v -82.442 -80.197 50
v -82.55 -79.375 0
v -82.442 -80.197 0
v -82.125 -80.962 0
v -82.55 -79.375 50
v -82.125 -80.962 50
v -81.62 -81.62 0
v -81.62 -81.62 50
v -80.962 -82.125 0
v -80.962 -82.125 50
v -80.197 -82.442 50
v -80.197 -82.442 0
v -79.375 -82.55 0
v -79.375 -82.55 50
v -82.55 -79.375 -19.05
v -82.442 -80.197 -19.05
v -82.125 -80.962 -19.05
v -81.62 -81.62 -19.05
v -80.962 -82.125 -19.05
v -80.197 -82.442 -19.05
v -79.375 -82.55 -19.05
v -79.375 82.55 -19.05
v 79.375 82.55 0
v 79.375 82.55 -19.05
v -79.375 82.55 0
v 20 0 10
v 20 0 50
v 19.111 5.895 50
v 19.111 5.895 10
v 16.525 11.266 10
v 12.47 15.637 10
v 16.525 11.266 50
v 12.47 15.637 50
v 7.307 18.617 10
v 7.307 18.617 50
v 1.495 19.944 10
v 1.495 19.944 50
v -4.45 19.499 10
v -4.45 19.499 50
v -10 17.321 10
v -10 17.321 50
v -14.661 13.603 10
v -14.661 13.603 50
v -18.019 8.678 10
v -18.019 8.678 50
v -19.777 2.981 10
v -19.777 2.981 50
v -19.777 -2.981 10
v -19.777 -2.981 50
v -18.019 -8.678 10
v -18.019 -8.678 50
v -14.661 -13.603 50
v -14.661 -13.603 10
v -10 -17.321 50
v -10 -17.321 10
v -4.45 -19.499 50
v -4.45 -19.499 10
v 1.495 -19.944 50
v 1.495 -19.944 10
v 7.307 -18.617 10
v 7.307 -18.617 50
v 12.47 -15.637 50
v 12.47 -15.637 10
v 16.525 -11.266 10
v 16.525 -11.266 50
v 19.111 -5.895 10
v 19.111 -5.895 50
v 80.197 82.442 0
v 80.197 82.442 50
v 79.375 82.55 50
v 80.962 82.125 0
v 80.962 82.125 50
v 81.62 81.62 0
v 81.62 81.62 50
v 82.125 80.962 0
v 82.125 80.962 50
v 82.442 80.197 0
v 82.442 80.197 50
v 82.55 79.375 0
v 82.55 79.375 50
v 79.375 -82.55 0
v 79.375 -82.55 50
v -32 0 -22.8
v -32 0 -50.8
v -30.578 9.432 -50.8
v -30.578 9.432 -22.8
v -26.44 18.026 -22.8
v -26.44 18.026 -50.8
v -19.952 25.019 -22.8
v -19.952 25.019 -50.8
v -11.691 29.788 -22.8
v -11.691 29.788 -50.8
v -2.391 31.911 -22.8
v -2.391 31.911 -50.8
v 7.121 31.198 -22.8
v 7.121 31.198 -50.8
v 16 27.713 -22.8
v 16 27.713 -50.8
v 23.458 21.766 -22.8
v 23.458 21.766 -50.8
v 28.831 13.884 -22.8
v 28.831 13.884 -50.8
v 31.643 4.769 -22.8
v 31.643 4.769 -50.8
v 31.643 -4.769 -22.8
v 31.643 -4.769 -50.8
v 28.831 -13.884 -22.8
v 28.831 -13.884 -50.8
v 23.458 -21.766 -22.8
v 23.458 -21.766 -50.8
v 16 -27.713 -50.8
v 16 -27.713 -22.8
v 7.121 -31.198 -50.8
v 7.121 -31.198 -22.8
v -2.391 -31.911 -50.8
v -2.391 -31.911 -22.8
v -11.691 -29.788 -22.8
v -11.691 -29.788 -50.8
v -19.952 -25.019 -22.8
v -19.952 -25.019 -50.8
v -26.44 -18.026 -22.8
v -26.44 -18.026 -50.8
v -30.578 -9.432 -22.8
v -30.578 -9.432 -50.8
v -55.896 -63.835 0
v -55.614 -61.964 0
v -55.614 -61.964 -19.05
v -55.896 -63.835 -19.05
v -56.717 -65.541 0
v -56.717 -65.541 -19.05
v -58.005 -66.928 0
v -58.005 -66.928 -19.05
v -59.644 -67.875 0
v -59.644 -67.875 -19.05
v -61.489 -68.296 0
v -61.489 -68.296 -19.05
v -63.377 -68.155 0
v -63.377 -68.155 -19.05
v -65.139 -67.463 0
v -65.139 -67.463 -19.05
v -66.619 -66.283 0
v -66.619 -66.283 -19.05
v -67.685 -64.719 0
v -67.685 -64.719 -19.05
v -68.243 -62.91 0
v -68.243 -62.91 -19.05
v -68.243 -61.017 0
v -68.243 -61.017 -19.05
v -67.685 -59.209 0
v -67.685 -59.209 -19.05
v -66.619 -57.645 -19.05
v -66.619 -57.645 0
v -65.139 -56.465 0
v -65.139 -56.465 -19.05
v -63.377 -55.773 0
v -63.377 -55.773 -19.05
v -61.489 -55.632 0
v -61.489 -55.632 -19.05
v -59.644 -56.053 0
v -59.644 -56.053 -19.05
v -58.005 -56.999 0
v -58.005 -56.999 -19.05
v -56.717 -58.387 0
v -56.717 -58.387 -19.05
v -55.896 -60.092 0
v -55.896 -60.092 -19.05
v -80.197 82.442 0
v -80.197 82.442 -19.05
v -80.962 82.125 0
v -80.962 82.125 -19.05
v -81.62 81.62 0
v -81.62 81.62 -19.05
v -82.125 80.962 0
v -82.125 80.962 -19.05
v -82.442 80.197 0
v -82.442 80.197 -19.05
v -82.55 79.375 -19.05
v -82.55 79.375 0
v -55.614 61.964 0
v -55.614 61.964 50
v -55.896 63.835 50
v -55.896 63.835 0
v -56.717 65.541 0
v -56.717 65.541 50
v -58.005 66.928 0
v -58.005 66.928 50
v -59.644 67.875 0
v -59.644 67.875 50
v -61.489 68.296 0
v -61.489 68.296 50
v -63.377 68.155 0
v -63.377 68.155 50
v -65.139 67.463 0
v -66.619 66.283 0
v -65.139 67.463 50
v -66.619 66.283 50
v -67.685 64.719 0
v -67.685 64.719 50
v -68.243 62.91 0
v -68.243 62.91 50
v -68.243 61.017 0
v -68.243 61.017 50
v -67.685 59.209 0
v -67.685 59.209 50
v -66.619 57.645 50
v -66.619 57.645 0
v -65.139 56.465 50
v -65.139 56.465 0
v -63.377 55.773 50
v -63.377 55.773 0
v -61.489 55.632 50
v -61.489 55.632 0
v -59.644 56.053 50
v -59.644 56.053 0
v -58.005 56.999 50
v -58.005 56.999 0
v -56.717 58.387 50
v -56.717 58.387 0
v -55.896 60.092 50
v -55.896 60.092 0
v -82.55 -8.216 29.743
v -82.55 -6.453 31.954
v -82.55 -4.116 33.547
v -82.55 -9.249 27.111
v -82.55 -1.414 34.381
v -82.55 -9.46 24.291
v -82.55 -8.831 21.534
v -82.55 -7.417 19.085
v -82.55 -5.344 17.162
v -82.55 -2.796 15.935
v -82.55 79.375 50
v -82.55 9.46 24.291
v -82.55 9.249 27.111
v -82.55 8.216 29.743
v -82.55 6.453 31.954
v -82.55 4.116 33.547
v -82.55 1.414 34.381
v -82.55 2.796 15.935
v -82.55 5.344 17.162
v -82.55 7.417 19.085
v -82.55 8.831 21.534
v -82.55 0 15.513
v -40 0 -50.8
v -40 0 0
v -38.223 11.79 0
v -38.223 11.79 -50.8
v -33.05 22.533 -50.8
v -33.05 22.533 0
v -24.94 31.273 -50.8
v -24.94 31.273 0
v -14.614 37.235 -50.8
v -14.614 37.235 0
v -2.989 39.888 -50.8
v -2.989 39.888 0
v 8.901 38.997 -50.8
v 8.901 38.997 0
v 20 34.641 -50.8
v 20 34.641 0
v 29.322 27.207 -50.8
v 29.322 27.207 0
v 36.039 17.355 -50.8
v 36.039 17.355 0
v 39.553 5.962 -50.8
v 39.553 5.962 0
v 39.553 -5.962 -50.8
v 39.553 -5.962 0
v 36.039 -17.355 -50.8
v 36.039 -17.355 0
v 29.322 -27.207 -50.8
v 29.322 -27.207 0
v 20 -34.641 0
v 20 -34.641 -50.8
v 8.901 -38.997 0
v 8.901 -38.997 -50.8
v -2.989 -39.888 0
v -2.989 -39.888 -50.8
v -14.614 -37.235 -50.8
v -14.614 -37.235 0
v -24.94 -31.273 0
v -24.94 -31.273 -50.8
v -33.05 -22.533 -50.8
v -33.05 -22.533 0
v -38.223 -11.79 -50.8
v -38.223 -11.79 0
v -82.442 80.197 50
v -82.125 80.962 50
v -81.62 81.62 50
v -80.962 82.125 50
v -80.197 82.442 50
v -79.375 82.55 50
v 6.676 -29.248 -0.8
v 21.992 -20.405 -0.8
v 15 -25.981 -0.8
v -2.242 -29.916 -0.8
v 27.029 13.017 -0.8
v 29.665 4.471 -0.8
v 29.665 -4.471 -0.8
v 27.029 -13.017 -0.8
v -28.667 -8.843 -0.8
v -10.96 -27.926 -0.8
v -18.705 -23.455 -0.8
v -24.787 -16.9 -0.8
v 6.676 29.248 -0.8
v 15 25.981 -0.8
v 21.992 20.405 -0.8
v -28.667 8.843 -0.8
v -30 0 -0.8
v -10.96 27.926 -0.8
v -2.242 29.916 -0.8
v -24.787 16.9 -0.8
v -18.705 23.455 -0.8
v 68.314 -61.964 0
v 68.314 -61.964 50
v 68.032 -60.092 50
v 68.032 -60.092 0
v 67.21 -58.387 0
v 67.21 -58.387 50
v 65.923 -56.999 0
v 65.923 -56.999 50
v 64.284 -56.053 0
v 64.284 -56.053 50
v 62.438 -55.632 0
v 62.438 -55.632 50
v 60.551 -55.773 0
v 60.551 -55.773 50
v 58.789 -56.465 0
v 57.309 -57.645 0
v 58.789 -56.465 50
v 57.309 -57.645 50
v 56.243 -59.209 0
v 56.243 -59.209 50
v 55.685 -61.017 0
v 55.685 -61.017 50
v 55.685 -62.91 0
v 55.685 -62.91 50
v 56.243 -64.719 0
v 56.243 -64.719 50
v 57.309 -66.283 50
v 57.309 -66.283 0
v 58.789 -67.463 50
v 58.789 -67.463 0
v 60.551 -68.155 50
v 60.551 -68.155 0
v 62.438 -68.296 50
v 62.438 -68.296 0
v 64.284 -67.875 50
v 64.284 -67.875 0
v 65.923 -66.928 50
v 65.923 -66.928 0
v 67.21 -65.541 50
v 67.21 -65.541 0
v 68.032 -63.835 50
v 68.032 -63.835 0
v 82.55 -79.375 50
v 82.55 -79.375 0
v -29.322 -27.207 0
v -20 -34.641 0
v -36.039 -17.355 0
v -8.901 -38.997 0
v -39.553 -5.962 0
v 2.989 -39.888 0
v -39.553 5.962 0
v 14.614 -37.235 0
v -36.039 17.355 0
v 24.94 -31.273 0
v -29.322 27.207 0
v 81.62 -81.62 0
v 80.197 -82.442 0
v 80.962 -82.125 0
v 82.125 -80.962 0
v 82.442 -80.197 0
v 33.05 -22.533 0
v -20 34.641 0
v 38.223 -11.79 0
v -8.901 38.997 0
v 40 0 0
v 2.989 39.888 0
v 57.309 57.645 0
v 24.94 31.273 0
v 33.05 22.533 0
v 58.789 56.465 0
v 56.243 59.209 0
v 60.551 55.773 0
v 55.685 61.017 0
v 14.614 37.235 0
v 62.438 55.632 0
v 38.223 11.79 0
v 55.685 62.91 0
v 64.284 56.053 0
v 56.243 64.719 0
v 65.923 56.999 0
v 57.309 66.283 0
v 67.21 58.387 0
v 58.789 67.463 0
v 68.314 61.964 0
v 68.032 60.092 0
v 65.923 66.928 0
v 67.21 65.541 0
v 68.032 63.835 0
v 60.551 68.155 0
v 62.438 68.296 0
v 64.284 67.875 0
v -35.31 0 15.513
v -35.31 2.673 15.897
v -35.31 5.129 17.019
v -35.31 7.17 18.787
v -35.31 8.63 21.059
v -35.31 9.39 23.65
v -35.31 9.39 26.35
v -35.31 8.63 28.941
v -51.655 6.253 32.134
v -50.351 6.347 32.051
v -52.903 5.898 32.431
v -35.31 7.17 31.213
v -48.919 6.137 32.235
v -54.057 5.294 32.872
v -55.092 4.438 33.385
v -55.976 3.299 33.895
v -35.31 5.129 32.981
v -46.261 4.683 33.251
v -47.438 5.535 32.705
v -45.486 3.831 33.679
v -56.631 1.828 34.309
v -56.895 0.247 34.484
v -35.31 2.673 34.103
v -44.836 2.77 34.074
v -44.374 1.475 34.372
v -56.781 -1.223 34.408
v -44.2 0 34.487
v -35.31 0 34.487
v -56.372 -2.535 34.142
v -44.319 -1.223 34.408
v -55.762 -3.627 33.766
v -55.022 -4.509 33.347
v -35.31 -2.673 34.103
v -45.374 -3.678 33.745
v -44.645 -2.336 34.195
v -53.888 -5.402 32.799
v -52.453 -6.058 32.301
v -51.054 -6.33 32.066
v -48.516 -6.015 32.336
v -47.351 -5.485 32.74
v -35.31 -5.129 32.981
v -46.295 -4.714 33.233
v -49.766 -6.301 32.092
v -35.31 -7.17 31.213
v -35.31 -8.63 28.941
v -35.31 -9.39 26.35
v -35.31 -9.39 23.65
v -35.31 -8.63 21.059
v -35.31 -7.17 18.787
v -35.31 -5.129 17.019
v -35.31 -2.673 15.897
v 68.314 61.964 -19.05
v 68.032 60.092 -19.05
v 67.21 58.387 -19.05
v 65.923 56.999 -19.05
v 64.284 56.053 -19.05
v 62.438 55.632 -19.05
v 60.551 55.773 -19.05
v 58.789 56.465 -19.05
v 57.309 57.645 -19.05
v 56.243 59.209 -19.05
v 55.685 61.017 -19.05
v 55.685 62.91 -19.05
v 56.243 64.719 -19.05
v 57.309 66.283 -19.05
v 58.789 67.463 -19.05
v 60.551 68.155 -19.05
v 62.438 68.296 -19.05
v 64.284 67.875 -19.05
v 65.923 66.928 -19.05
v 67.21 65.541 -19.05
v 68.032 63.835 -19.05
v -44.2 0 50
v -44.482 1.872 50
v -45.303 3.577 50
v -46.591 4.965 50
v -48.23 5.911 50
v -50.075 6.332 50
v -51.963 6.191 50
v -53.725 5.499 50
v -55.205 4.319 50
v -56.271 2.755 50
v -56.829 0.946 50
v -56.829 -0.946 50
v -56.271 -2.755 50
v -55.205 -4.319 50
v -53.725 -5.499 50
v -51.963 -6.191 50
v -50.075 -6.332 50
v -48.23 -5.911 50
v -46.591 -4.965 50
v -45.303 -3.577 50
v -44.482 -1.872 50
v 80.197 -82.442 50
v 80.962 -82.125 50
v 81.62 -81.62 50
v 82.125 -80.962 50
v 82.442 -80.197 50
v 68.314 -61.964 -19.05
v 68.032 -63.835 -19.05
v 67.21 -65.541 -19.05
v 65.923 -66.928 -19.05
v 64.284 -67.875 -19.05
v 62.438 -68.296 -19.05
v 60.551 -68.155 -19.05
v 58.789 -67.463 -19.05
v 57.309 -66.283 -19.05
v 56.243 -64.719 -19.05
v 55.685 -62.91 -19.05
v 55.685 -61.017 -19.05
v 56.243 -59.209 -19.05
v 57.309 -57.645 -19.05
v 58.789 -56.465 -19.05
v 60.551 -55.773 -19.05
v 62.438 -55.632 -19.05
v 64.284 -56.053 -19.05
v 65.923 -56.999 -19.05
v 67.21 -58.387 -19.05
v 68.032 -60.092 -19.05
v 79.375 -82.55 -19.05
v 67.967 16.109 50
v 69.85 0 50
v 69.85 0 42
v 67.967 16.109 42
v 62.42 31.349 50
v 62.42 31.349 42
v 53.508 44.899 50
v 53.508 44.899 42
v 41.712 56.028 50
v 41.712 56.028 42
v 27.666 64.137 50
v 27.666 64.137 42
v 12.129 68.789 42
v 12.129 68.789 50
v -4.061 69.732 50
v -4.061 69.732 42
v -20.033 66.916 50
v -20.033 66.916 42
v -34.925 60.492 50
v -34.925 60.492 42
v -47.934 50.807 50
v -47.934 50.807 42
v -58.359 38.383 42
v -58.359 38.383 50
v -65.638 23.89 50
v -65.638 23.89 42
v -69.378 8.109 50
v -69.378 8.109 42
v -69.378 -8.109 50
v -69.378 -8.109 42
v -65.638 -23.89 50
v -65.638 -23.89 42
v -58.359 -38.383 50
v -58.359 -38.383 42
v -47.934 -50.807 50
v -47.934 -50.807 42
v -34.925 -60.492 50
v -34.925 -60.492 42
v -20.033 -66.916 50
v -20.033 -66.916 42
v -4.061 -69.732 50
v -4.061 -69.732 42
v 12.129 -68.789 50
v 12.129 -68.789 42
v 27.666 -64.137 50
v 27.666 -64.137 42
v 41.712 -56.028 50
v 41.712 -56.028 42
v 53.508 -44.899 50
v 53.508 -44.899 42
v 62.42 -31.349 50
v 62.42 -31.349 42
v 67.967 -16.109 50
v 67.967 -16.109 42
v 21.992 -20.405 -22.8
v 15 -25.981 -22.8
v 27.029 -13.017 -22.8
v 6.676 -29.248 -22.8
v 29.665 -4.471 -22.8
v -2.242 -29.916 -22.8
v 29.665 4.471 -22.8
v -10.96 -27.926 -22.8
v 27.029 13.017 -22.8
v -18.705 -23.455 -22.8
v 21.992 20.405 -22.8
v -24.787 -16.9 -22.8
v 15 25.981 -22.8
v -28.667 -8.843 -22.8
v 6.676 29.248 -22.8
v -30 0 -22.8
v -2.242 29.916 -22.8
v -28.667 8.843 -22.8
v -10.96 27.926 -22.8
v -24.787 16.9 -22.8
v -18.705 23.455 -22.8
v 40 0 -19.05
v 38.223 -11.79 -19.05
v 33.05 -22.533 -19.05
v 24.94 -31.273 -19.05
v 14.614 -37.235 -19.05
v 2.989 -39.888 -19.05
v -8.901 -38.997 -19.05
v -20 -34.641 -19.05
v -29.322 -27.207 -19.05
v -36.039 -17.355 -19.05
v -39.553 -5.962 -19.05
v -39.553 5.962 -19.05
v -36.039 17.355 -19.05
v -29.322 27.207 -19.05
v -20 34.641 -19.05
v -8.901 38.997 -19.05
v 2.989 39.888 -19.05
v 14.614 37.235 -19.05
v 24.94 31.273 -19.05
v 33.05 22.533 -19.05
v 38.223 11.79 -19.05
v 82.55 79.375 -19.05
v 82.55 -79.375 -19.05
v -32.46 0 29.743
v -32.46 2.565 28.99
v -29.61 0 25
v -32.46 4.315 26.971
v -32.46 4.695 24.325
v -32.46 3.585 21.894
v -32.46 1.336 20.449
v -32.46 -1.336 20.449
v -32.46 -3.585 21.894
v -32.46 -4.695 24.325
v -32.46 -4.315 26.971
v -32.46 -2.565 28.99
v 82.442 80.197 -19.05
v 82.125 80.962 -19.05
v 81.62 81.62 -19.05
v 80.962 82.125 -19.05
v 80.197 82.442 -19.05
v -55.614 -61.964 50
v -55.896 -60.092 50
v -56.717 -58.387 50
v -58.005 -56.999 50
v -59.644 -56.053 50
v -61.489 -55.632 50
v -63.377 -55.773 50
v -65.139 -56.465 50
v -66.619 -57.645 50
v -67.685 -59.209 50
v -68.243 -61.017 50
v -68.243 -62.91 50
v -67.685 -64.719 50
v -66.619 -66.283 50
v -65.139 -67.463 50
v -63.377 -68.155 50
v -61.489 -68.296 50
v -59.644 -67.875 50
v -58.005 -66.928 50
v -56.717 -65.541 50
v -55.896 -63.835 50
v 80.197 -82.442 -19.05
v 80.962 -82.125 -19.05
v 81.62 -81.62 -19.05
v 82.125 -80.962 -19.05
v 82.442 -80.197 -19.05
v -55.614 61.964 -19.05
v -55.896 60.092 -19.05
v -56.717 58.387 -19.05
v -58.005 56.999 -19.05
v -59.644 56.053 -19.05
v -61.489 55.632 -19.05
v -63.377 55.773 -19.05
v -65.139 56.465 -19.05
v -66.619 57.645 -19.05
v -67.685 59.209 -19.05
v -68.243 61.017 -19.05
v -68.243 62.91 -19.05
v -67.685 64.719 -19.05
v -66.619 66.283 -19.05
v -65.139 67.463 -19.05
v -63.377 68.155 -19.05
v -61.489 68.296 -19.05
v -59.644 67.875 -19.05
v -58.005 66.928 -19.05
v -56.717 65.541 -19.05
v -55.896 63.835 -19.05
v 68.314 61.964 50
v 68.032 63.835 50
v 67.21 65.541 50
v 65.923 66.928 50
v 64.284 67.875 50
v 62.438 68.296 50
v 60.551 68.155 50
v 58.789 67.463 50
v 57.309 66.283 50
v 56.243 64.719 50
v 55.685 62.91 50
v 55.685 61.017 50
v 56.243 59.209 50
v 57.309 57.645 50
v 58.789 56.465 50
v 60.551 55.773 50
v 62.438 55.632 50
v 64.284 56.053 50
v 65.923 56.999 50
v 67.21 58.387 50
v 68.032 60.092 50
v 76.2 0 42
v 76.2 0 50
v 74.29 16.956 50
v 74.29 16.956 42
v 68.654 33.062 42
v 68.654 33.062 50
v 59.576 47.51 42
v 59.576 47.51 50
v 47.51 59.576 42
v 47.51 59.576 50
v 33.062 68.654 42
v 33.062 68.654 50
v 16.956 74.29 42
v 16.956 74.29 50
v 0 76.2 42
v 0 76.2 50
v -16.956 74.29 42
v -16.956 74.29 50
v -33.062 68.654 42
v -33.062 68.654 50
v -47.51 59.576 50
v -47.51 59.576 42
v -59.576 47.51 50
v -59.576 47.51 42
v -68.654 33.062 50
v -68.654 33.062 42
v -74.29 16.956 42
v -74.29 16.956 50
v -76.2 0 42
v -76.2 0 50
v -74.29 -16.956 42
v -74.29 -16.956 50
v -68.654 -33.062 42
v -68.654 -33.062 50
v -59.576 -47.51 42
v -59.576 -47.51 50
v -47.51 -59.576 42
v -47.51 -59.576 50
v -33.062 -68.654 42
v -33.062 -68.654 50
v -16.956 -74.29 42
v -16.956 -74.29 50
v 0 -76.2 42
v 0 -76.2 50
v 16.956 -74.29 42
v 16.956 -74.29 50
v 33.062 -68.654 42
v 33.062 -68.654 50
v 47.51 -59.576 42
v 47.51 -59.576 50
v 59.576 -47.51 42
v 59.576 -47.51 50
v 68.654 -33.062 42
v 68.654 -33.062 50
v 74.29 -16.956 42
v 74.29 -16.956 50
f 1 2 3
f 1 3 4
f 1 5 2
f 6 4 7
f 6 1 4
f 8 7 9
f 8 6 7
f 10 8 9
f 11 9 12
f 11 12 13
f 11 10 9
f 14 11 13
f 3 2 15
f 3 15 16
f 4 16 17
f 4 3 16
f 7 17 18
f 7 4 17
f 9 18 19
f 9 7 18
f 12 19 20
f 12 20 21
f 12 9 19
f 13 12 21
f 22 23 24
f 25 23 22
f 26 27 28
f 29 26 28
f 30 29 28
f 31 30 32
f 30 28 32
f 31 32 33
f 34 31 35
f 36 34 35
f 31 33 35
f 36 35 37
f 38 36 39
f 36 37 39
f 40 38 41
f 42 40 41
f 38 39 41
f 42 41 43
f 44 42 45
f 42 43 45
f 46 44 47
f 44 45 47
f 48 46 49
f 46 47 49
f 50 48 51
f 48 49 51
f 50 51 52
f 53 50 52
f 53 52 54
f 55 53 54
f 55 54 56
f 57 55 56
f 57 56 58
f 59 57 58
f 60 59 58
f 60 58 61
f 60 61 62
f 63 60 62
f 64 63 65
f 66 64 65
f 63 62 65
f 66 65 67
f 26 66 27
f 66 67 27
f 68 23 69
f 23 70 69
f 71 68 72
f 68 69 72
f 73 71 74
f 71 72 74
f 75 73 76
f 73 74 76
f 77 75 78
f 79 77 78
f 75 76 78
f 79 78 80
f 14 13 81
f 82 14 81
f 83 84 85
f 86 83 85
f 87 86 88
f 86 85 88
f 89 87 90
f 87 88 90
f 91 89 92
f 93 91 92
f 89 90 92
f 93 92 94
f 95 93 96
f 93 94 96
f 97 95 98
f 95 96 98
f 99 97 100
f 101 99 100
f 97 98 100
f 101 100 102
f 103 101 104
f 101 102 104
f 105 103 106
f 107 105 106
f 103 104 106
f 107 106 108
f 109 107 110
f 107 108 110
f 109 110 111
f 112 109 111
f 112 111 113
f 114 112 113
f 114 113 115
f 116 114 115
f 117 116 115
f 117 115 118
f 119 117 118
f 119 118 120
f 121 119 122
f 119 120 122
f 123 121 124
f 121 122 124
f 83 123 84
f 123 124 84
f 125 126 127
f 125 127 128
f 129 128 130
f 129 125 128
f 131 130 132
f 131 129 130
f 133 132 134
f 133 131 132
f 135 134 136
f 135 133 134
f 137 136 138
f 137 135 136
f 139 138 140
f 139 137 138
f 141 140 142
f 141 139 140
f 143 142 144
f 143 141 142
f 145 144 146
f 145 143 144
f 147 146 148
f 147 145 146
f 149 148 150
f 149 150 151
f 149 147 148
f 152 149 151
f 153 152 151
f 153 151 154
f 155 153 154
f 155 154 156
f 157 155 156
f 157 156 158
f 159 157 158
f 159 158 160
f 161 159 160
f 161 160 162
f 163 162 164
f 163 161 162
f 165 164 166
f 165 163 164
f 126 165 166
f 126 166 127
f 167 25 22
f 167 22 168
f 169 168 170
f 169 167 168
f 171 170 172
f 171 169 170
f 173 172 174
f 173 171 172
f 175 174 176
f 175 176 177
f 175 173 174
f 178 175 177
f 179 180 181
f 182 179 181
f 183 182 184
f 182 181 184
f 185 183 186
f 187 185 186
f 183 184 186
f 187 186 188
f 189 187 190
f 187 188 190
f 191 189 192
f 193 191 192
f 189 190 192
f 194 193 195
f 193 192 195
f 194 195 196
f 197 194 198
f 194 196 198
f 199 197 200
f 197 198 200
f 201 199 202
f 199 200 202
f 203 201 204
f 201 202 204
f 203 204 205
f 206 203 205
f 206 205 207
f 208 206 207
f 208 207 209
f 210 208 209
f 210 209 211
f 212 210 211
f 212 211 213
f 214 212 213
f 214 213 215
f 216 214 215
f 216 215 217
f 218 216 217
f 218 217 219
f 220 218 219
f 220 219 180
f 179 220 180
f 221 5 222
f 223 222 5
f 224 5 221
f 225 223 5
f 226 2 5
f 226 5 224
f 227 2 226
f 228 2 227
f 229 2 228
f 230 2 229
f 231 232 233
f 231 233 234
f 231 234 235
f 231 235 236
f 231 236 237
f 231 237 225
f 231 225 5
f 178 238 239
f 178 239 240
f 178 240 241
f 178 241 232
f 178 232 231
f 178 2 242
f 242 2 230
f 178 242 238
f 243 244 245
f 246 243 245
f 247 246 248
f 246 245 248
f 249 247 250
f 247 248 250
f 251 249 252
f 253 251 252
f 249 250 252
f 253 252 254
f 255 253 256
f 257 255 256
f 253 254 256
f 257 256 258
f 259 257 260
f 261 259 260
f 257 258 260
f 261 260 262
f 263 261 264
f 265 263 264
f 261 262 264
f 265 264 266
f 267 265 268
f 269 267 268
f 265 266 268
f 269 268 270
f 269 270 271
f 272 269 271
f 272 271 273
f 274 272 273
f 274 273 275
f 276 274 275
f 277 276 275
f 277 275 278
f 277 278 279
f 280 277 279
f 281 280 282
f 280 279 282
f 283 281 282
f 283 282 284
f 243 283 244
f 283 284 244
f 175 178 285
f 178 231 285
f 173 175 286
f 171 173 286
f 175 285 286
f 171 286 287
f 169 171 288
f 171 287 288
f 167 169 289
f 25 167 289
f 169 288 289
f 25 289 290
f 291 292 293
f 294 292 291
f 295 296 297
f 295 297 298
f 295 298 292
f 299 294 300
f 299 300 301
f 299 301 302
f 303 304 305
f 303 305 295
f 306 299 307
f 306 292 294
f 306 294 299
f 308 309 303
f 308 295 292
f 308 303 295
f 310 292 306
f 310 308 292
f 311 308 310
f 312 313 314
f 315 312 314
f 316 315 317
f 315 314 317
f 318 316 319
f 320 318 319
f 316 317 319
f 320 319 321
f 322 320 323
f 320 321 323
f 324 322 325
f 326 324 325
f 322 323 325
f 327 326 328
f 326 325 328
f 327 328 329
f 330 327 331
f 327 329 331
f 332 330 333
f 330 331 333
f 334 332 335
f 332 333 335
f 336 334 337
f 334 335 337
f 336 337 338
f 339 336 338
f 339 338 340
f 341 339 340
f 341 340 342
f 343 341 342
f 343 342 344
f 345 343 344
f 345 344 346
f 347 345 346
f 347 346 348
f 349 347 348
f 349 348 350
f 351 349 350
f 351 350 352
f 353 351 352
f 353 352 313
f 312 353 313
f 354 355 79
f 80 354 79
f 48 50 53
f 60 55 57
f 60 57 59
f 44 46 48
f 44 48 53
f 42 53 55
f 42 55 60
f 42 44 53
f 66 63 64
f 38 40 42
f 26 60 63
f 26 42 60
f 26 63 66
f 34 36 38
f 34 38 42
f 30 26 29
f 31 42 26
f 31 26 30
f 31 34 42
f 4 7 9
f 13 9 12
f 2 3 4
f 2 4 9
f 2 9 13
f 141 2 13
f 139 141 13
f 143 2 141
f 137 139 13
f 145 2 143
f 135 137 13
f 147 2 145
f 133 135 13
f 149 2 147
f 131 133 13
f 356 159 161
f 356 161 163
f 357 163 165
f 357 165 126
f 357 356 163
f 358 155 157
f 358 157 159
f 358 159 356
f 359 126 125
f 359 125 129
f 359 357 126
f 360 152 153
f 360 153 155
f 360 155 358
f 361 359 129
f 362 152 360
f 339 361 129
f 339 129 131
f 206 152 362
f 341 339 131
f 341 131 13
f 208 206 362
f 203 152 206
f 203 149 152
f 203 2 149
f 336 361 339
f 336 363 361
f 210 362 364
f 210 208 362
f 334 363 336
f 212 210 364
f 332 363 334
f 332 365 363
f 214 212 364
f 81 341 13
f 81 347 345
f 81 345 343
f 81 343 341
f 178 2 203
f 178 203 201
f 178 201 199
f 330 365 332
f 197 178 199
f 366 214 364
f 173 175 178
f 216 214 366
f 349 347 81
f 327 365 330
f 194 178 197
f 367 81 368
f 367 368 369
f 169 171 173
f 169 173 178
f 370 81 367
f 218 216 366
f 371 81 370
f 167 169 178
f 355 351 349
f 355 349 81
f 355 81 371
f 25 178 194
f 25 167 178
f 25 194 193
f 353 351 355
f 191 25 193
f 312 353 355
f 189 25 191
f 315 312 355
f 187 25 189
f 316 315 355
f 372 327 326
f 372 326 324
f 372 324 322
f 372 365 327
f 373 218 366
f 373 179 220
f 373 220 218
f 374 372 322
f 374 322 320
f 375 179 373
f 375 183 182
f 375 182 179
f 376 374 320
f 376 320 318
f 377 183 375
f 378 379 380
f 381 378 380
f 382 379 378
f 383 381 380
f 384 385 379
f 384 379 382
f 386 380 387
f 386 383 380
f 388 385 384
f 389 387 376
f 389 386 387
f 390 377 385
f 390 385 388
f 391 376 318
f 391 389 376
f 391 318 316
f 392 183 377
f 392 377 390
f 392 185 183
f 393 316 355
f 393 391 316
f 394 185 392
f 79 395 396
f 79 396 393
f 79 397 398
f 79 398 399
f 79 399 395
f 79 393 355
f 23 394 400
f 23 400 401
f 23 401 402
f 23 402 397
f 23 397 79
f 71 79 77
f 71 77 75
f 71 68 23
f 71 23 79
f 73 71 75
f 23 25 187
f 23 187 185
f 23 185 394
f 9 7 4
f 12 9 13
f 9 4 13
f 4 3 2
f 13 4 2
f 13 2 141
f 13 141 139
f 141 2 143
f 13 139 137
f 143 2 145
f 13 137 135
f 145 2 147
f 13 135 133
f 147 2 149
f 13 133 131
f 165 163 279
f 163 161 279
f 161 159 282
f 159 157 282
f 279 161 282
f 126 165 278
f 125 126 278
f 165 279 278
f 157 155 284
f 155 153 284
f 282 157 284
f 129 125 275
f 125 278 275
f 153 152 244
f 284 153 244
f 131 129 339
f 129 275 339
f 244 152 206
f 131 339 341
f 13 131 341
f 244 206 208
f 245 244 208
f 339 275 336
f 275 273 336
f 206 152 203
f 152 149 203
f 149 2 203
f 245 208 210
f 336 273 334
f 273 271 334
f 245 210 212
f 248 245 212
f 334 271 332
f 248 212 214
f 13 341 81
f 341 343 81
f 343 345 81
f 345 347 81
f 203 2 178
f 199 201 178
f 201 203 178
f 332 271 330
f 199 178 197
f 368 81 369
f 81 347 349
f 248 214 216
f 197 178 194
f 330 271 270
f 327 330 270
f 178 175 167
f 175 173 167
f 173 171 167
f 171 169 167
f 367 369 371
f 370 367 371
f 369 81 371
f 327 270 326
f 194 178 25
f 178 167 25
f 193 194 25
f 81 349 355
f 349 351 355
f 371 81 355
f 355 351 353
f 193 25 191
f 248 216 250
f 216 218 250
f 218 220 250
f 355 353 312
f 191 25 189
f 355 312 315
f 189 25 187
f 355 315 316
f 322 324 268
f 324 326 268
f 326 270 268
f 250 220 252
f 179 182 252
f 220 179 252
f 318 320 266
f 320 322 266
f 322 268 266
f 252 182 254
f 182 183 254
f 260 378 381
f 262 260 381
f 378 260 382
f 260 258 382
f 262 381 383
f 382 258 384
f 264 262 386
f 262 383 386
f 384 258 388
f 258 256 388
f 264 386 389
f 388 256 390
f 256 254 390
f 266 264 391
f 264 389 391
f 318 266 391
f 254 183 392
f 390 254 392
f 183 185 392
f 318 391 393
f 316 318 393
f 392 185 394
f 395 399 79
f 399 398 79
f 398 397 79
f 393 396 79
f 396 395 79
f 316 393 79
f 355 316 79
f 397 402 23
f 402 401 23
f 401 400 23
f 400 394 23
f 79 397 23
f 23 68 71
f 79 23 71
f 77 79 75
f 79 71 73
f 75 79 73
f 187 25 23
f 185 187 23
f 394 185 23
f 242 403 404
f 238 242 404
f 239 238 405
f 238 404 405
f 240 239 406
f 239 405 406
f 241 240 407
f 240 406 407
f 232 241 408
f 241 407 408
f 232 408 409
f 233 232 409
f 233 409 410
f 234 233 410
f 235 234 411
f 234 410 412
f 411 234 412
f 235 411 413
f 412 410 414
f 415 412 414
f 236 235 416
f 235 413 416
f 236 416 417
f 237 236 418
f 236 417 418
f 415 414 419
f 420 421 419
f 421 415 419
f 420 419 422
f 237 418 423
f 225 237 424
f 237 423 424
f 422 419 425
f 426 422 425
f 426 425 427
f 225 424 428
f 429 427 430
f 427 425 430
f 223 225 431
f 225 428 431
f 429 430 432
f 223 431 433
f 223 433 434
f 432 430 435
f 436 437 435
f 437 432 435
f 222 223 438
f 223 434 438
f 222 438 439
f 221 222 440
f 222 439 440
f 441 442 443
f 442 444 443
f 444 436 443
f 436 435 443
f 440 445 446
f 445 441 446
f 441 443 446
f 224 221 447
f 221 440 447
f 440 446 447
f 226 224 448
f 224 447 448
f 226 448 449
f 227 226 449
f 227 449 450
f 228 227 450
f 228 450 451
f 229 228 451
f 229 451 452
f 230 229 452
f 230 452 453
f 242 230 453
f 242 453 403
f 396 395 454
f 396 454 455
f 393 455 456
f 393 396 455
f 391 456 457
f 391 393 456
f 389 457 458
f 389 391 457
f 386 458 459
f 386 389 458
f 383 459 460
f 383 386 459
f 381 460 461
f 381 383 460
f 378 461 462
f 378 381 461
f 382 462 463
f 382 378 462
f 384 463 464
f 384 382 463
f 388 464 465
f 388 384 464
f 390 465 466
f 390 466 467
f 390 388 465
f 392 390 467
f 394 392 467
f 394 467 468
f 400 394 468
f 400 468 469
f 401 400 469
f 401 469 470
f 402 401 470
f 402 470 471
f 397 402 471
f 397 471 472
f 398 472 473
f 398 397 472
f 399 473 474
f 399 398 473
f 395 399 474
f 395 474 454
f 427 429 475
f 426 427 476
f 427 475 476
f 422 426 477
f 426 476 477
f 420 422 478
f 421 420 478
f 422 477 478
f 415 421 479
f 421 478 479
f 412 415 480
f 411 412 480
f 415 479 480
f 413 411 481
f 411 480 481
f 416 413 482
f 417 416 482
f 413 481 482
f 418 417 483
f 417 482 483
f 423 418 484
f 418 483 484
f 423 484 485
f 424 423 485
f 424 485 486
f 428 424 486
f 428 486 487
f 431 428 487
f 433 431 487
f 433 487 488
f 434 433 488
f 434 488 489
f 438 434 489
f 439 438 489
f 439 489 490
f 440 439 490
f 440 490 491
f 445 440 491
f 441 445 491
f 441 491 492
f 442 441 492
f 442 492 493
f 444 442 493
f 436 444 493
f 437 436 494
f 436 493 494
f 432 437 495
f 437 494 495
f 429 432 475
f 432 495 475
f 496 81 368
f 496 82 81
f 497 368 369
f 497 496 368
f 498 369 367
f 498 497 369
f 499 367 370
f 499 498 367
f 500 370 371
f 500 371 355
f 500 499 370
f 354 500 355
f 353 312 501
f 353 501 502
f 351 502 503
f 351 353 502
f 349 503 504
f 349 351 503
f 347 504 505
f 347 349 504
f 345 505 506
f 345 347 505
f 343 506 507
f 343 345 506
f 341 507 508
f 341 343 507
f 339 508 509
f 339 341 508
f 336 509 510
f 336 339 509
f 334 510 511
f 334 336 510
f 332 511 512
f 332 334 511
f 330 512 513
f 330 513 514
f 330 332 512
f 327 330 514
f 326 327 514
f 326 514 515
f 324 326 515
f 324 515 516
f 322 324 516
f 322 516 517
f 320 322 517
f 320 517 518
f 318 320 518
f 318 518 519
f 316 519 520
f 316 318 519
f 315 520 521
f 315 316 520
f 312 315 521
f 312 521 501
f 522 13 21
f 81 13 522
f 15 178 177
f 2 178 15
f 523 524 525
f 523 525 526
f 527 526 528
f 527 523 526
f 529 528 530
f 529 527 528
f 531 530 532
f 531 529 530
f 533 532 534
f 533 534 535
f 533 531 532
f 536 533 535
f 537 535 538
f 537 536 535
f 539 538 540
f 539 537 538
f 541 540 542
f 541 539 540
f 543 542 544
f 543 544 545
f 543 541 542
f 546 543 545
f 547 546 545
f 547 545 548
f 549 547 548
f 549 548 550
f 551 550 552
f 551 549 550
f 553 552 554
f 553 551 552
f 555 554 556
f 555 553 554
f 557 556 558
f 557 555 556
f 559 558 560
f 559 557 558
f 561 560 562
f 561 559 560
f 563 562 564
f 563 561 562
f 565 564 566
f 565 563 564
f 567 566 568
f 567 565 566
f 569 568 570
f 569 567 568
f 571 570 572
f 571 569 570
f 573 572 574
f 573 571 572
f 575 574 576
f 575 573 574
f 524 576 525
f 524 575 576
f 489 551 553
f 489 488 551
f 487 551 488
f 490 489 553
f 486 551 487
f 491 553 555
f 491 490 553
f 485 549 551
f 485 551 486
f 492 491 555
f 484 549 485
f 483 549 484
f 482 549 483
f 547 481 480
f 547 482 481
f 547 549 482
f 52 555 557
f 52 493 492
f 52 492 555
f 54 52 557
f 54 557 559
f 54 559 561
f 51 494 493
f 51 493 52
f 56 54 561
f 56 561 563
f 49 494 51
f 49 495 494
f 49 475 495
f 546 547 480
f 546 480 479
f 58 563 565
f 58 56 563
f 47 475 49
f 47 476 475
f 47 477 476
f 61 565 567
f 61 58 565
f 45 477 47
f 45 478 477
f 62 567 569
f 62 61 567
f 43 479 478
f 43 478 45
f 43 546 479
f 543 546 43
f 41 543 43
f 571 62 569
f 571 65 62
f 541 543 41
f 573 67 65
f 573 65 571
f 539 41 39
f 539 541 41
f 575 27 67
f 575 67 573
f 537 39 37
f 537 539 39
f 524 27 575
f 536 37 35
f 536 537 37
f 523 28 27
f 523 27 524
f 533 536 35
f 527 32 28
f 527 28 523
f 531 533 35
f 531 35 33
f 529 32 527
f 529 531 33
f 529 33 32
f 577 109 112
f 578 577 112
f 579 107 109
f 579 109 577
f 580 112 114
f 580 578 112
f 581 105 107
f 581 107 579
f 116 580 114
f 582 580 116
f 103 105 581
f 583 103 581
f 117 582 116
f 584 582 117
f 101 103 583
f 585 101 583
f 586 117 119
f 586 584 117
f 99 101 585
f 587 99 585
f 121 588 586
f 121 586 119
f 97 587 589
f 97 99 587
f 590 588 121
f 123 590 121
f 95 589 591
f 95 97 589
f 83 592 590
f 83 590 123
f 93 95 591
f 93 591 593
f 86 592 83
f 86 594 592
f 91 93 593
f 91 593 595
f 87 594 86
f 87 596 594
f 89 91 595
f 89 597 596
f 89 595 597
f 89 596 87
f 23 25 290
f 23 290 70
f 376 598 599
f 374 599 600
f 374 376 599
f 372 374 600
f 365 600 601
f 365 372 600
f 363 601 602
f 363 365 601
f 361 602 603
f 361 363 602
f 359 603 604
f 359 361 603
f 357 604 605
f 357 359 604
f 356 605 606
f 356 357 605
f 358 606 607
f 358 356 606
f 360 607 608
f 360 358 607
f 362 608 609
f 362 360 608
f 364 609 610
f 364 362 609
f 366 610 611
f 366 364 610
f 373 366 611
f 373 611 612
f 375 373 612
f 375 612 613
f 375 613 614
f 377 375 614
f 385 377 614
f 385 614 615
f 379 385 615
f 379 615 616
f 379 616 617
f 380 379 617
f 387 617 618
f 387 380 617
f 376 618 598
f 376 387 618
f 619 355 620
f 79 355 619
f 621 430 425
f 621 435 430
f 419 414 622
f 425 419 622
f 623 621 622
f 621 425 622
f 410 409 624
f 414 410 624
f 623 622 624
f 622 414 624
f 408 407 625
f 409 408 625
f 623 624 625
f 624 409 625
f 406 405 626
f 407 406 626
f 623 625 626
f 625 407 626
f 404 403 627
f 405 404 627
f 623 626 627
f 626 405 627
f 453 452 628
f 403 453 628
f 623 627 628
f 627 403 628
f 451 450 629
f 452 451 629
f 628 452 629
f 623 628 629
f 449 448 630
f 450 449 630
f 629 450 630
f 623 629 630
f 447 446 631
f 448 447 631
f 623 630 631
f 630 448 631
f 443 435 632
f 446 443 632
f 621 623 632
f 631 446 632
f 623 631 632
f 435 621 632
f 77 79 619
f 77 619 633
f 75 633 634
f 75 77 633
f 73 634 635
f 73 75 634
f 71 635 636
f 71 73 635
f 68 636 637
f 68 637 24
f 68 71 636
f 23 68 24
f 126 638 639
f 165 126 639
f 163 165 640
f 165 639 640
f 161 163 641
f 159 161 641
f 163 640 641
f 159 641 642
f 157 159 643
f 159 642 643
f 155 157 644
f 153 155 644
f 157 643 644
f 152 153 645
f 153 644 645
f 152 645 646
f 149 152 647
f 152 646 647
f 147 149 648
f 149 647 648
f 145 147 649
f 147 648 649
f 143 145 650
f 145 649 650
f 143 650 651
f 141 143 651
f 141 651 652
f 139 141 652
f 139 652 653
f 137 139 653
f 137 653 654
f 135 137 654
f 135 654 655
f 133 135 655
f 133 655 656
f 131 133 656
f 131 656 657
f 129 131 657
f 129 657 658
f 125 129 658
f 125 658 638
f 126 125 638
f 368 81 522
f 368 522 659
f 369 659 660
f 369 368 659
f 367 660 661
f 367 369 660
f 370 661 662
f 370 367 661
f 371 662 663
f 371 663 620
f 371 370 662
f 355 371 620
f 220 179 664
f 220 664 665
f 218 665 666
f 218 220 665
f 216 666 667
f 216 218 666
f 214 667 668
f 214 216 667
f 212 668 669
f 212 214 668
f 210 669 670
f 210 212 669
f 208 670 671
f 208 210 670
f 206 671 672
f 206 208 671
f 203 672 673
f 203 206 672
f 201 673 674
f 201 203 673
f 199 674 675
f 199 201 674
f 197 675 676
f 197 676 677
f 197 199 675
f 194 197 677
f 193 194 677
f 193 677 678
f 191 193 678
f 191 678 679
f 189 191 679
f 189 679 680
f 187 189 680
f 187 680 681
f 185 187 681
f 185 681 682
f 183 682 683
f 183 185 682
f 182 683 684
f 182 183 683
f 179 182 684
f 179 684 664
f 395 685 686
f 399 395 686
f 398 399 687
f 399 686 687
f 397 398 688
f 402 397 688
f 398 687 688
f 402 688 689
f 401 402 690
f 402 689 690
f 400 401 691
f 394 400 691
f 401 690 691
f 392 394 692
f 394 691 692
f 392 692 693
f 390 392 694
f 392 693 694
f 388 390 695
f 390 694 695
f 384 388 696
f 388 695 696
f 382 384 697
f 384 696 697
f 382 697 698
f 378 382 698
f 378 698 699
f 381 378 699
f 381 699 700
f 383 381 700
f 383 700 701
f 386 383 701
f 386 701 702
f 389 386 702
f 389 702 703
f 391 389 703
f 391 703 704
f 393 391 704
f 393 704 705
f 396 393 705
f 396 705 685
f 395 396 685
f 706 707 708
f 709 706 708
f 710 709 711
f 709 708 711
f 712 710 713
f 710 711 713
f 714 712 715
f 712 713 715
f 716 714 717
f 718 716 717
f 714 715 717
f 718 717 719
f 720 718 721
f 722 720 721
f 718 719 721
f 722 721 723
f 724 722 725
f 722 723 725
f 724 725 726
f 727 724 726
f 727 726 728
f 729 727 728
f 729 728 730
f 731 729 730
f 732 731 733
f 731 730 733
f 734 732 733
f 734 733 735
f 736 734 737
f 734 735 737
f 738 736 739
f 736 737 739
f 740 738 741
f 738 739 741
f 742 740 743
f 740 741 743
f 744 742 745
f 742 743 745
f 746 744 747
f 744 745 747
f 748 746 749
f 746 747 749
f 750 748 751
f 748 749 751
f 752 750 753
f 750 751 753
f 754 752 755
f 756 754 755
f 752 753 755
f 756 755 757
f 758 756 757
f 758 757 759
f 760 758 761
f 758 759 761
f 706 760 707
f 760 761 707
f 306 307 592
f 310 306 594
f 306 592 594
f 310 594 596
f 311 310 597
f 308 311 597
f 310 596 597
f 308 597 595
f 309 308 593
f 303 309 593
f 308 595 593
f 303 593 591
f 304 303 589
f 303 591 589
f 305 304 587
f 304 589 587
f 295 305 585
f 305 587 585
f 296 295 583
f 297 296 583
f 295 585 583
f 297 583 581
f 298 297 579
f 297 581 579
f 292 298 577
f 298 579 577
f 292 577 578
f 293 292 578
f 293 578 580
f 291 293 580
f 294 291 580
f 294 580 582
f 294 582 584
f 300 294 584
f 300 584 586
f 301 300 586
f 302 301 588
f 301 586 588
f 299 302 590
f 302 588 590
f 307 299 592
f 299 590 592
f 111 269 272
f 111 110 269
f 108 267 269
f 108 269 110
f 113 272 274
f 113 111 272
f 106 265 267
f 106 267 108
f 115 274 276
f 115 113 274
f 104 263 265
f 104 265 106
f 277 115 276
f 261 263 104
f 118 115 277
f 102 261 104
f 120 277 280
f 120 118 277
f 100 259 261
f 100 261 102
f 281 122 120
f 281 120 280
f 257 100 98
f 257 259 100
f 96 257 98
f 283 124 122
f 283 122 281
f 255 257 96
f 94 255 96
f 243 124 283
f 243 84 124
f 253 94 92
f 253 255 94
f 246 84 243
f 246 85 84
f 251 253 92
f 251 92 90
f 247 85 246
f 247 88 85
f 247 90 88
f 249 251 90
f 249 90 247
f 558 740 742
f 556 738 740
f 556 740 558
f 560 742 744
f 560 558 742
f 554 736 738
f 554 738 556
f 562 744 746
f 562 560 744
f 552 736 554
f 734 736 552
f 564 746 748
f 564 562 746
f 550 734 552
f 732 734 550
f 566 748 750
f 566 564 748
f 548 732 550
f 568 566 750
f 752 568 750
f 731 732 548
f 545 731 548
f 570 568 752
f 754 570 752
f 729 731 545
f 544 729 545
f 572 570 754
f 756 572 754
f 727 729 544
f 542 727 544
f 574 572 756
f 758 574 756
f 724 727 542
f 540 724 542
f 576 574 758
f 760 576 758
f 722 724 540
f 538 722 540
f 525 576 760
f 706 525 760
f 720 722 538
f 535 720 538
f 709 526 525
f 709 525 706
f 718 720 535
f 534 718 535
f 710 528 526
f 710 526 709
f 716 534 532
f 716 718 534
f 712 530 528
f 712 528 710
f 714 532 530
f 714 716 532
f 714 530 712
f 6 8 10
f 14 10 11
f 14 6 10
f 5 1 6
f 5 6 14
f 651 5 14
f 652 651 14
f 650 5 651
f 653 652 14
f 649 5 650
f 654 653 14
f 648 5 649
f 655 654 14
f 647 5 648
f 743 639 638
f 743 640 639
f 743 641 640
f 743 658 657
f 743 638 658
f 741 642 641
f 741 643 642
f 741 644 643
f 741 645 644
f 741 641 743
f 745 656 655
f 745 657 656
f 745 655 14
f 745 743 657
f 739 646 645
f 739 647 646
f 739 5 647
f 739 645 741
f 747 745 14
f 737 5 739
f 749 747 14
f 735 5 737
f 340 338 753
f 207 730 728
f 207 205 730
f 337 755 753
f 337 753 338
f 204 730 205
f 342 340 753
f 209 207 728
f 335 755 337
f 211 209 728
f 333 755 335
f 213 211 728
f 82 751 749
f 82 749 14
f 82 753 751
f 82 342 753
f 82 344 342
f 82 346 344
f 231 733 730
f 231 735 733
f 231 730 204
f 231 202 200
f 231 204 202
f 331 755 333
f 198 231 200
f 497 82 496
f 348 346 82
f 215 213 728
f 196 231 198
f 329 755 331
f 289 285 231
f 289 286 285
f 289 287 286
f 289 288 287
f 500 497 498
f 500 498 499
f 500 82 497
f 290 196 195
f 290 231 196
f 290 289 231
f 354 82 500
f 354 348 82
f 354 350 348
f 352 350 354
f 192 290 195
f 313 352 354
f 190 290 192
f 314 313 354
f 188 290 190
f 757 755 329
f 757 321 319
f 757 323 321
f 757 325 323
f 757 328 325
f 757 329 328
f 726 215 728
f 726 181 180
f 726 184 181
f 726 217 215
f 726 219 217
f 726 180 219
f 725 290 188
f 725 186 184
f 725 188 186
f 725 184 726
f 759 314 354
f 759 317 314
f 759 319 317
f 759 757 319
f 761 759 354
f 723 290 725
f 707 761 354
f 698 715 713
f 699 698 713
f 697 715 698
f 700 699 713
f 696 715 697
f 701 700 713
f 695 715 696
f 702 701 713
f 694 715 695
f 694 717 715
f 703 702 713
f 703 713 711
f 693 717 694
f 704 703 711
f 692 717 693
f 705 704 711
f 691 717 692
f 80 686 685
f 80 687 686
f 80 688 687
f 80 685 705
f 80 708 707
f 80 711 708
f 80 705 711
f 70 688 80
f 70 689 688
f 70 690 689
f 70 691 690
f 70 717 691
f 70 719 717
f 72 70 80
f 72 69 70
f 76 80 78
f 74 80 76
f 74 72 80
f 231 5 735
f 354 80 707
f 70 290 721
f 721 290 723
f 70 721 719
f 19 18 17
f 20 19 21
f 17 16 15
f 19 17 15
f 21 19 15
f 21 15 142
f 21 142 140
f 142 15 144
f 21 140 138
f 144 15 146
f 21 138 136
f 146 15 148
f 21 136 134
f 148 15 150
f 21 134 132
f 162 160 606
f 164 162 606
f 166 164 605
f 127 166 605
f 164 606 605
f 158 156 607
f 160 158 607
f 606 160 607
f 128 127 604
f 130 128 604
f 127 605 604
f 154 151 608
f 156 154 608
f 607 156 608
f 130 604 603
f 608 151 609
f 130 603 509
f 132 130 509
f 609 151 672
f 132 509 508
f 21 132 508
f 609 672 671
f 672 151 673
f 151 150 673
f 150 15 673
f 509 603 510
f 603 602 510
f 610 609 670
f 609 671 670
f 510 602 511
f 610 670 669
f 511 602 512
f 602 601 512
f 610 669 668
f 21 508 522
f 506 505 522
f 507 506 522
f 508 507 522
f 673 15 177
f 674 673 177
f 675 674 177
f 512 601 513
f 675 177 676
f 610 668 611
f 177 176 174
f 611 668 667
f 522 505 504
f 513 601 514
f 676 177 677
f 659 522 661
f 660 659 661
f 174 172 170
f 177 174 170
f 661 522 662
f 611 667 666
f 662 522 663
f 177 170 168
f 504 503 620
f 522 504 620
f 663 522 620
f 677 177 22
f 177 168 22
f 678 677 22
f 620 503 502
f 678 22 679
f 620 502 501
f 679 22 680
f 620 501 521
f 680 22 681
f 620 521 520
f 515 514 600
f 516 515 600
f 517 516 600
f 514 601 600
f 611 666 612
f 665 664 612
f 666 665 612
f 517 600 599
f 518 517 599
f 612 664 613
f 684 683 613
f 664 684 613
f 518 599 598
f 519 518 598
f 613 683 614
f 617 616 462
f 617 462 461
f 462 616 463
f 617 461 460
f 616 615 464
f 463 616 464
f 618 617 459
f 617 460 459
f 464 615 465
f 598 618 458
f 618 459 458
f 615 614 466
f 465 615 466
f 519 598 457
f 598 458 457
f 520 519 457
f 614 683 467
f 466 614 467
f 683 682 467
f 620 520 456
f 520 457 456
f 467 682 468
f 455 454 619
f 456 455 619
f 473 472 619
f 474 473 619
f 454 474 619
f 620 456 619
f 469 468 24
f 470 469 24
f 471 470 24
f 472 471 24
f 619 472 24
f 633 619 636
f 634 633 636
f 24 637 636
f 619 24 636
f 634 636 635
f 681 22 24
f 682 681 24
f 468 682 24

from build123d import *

# Parameters (mm, degrees)
SKETCH1_W                        = 165.1
SKETCH1_H                        = 165.1
BOSS_EXTRUDE1_DEPTH              = 50
SKETCH2_R                        = 40
BOSS_EXTRUDE2_DEPTH              = 50.8
SKETCH4_R                        = 32
CUT_EXTRUDE1_DEPTH               = 28
SKETCH5_R                        = 30
CUT_EXTRUDE2_DEPTH               = 22
FILLET1_R                        = 3.175
SKETCH6_R                        = 20
CUT_EXTRUDE4_DEPTH               = 40
SKETCH7_R                        = 76.2
SKETCH7_R_2                      = 69.85
CUT_EXTRUDE5_DEPTH               = 8
F_1_2_14_NPSM_TAPPED_HOLE1_D     = 18.9738
F_1_2_14_NPSM_TAPPED_HOLE1_DEPTH = 47.24
F_1_2_14_NPSM_TAPPED_HOLE1_TIP   = 5.700304607
SKETCH11_R                       = 6.35
CUT_EXTRUDE6_DEPTH               = 25
SKETCH12_R                       = 6.35
CUT_EXTRUDE7_DEPTH               = 155.23892186
SKETCH13_R                       = 40
SKETCH13_R_2                     = 6.35
BOSS_EXTRUDE3_DEPTH              = 19.05


with BuildPart() as part:
    # Sketch1 → Boss-Extrude1 (new body)
    with BuildSketch(Plane.XY):
        Rectangle(SKETCH1_W, SKETCH1_H)
    extrude(amount=BOSS_EXTRUDE1_DEPTH)

    # Sketch2 → Boss-Extrude2 (add)
    with BuildSketch(Plane(origin=(0, 0, 0), x_dir=(-1, 0, 0), z_dir=(0, 0, -1))):
        Circle(SKETCH2_R)
    extrude(amount=BOSS_EXTRUDE2_DEPTH)

    # Sketch4 → Cut-Extrude1 (cut)
    with BuildSketch(Plane(origin=(0, 0, -50.8), x_dir=(-1, 0, 0), z_dir=(0, 0, -1))):
        Circle(SKETCH4_R)
    extrude(amount=-CUT_EXTRUDE1_DEPTH, mode=Mode.SUBTRACT)

    # Sketch5 → Cut-Extrude2 (cut)
    with BuildSketch(Plane(origin=(0, 0, -22.8), x_dir=(-1, 0, 0), z_dir=(0, 0, -1))):
        Circle(SKETCH5_R)
    extrude(amount=-CUT_EXTRUDE2_DEPTH, mode=Mode.SUBTRACT)

    # Fillet1
    fillet1_edges = [part.edges().sort_by_distance(p)[0] for p in [
        (-82.55, 82.55, 25),
        (82.55, 82.55, 25),
        (82.55, -82.55, 25),
        (-82.55, -82.55, 25),
    ]]
    fillet(fillet1_edges, radius=FILLET1_R)

    # Sketch6 → Cut-Extrude4 (cut)
    with BuildSketch(Plane.XY.offset(50)):
        Circle(SKETCH6_R)
    extrude(amount=-CUT_EXTRUDE4_DEPTH, mode=Mode.SUBTRACT)

    # Sketch7 → Cut-Extrude5 (cut)
    with BuildSketch(Plane.XY.offset(50)):
        Circle(SKETCH7_R)
        Circle(SKETCH7_R_2, mode=Mode.SUBTRACT)
    extrude(amount=-CUT_EXTRUDE5_DEPTH, mode=Mode.SUBTRACT)

    # 1/2-14 NPSM Tapped Hole1
    with Locations(Plane.ZY.offset(82.55)):
        with Locations((25, 0)):
            Hole(F_1_2_14_NPSM_TAPPED_HOLE1_D / 2, depth=F_1_2_14_NPSM_TAPPED_HOLE1_DEPTH)
            with Locations((0, 0, -(F_1_2_14_NPSM_TAPPED_HOLE1_DEPTH + F_1_2_14_NPSM_TAPPED_HOLE1_TIP / 2))):  # 118° drill point
                Cone(0, F_1_2_14_NPSM_TAPPED_HOLE1_D / 2, F_1_2_14_NPSM_TAPPED_HOLE1_TIP, mode=Mode.SUBTRACT)

    # Sketch11 → Cut-Extrude6 (cut)
    with BuildSketch(Plane.XY.offset(50)):
        with Locations((-50.55, 0)):
            Circle(SKETCH11_R)
    extrude(amount=-CUT_EXTRUDE6_DEPTH, mode=Mode.SUBTRACT)

    # Sketch12 → Cut-Extrude7 (cut, through all)
    with BuildSketch(Plane.XY.offset(50)):
        with Locations((-61.963767235, 61.963767235)):
            Circle(SKETCH12_R)
        with Locations((61.963767235, 61.963767235)):
            Circle(SKETCH12_R)
        with Locations((61.963767235, -61.963767235)):
            Circle(SKETCH12_R)
        with Locations((-61.963767235, -61.963767235)):
            Circle(SKETCH12_R)
    extrude(amount=-CUT_EXTRUDE7_DEPTH, mode=Mode.SUBTRACT)


with BuildPart() as body_2:
    # Sketch13 → Boss-Extrude3 (new body)
    with BuildSketch(Plane(origin=(0, 0, 0), x_dir=(-1, 0, 0), z_dir=(0, 0, -1))):
        with BuildLine():
            Line((-79.375, 82.55), (79.375, 82.55))
            ThreePointArc((79.375, 82.55), (81.62006403, 81.62006403), (82.55, 79.375))
            Line((82.55, 79.375), (82.55, -79.375))
            ThreePointArc((82.55, -79.375), (81.62006403, -81.62006403), (79.375, -82.55))
            Line((79.375, -82.55), (-79.375, -82.55))
            ThreePointArc((-79.375, -82.55), (-81.62006403, -81.62006403), (-82.55, -79.375))
            Line((-82.55, -79.375), (-82.55, 79.375))
            ThreePointArc((-82.55, 79.375), (-81.62006403, 81.62006403), (-79.375, 82.55))
        make_face()
        with Locations(Location((0, 0, 0), (0, 0, 180))):
            Circle(SKETCH13_R, mode=Mode.SUBTRACT)
        with Locations(Location((61.963767235, 61.963767235, 0), (0, 0, 180))):
            Circle(SKETCH13_R_2, mode=Mode.SUBTRACT)
        with Locations(Location((-61.963767235, 61.963767235, 0), (0, 0, 180))):
            Circle(SKETCH13_R_2, mode=Mode.SUBTRACT)
        with Locations(Location((-61.963767235, -61.963767235, 0), (0, 0, 180))):
            Circle(SKETCH13_R_2, mode=Mode.SUBTRACT)
        with Locations(Location((61.963767235, -61.963767235, 0), (0, 0, 180))):
            Circle(SKETCH13_R_2, mode=Mode.SUBTRACT)
    extrude(amount=BOSS_EXTRUDE3_DEPTH)


solid = Compound([part.part, body_2.part])
